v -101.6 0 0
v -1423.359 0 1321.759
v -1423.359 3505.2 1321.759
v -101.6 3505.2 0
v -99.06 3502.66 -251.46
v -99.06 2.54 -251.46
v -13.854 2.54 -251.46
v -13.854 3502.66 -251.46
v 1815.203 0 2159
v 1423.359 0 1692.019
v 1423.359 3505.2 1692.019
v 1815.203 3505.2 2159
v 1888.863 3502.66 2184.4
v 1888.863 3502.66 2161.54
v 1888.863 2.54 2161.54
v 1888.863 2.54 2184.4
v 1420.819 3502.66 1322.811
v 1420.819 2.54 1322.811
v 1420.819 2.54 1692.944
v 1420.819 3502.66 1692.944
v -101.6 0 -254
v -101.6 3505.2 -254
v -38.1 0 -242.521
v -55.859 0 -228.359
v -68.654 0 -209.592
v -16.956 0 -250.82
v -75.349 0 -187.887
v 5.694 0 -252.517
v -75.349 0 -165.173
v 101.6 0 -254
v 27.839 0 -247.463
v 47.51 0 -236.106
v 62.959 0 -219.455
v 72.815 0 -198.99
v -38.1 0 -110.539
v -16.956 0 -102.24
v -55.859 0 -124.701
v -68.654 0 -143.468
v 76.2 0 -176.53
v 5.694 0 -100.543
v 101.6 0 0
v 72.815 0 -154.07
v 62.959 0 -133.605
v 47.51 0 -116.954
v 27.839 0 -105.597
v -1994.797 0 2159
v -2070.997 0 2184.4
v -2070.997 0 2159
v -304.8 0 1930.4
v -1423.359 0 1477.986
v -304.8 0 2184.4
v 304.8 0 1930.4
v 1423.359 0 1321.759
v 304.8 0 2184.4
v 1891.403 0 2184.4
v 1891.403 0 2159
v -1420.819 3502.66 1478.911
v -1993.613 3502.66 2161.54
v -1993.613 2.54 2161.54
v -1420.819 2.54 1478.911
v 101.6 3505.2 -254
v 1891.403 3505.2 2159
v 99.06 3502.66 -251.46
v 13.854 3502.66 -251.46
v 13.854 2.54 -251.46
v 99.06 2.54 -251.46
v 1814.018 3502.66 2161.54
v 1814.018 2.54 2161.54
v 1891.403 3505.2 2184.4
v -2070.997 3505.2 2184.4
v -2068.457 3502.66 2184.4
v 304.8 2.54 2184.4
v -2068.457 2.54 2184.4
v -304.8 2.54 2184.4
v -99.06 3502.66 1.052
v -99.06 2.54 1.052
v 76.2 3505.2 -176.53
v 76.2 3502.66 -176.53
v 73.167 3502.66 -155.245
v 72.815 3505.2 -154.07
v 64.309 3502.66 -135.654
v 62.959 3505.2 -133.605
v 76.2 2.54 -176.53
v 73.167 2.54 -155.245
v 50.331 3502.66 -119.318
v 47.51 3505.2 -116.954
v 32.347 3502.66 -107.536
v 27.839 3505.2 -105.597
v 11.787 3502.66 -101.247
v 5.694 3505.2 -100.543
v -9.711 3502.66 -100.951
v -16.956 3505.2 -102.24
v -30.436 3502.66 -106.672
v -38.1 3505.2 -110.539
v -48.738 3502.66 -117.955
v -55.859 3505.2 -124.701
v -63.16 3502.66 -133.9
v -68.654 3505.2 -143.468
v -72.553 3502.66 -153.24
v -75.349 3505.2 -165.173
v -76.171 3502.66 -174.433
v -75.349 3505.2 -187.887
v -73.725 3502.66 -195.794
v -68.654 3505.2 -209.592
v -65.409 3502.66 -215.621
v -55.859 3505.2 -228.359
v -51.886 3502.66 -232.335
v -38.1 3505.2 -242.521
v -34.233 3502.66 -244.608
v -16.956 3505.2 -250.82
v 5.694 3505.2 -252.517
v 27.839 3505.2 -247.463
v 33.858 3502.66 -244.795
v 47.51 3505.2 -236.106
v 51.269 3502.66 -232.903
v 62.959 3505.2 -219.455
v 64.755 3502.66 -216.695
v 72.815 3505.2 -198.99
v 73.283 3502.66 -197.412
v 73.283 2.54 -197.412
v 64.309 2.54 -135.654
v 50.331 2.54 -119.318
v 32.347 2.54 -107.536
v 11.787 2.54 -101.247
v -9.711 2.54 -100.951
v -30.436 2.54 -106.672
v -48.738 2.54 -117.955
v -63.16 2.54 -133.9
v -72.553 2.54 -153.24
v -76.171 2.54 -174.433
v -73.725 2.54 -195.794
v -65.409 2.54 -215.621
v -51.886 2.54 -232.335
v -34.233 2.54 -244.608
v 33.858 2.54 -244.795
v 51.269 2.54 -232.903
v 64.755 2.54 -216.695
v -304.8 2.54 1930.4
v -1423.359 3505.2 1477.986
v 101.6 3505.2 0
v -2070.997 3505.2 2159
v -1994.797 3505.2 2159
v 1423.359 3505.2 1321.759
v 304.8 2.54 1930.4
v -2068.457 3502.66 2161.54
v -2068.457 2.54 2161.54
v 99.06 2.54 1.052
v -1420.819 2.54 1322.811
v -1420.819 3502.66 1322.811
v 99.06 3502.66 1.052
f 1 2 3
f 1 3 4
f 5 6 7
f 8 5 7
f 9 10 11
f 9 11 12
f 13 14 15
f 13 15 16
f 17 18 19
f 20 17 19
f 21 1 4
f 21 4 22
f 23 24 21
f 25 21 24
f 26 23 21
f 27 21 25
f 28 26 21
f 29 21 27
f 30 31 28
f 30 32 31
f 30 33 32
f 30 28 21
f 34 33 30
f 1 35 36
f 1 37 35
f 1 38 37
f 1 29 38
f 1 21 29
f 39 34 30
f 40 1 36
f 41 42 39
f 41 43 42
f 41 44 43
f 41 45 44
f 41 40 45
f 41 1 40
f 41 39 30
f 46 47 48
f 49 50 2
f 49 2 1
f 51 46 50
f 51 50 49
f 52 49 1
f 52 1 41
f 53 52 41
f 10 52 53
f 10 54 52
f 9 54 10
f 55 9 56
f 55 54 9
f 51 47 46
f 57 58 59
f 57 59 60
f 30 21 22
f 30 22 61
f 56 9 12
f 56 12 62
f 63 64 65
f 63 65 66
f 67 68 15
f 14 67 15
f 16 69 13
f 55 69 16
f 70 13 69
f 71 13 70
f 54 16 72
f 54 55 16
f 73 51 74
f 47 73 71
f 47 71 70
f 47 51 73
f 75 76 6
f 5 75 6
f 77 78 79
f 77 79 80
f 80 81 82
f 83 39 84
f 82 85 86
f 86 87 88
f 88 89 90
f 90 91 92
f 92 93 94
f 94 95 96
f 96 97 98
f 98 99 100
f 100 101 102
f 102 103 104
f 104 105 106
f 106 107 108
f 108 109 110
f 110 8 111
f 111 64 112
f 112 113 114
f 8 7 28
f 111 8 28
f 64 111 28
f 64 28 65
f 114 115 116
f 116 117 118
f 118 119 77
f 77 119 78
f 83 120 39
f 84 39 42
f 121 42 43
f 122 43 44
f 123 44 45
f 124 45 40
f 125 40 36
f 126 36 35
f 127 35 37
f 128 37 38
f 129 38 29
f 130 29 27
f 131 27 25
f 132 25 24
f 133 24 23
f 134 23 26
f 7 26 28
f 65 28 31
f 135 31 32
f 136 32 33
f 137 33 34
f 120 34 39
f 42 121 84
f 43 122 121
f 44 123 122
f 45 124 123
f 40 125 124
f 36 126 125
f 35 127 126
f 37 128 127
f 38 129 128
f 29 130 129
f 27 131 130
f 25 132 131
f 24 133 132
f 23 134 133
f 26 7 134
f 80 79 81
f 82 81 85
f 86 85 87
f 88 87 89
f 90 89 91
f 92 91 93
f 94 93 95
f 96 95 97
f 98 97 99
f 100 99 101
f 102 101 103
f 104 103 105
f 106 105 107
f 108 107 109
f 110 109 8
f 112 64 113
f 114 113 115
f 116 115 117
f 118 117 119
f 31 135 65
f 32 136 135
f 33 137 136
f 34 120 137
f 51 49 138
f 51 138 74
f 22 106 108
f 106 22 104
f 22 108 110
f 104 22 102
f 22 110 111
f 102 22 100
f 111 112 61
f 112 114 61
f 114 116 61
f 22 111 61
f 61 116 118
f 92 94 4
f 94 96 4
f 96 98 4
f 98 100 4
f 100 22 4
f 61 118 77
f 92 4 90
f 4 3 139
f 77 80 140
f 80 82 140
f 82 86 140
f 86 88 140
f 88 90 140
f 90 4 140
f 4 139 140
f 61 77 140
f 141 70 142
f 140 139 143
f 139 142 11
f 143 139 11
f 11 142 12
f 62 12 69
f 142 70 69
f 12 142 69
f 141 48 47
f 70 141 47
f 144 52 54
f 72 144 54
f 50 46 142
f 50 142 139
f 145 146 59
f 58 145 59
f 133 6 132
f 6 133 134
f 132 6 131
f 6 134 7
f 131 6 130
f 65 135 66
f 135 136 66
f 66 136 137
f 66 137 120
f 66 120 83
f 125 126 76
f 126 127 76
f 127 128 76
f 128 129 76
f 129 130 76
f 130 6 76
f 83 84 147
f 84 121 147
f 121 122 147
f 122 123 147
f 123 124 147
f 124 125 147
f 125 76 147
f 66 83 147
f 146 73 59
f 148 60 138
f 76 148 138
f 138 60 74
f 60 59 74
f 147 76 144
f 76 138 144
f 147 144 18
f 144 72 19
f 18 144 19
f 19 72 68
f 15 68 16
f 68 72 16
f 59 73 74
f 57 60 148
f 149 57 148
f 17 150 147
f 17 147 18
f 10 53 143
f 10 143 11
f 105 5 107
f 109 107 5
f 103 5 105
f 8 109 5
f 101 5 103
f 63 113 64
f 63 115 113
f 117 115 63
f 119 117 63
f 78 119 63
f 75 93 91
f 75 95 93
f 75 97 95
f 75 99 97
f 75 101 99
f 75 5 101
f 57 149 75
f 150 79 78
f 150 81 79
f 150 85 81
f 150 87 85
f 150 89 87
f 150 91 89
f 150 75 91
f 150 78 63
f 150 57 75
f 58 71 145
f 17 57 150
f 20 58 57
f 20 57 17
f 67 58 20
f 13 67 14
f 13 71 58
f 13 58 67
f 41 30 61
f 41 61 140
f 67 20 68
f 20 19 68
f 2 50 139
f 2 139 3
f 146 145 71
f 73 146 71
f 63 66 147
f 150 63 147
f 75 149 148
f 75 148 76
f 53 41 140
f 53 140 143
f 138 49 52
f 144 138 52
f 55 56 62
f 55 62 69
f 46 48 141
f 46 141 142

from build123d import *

# Parameters (mm, degrees)
F0_W     = 76.2
F0_H     = 25.4
F1_DEPTH = 3505.2
F2_T     = -2.54
F3_R     = 76.2
F4_DEPTH = 3505.201
F5_W     = 609.6
F5_H     = 254
F6_DEPTH = 25.4


with BuildPart() as f1:
    # F0 (on Front) → F1 (new body)
    with BuildSketch(Plane.XZ):
        with Locations((1853.3025709268, 2171.7)):
            Rectangle(F0_W, F0_H)
        Polygon((1423.3592440619, 1692.0193074747), (1815.2025709268, 2159), (1815.2025709268, 2184.4), (-1994.7974290732, 2184.4), (-1994.7974290732, 2159), (-1423.3592440619, 1477.9864900672), (-1423.3592440619, 1321.7592440619), (-101.6, 0), (-101.6, -254), (101.6, -254), (101.6, 0), (1423.3592440619, 1321.7592440619), align=None)
        with Locations((-2032.8974290732, 2171.7)):
            Rectangle(F0_W, F0_H)
    extrude(amount=-F1_DEPTH)

    # F2
    f2_openings = [f1.faces().sort_by_distance(p)[0] for p in [
        (-89.797429, 1752.6, 2184.4),
    ]]
    offset(amount=F2_T, openings=f2_openings, kind=Kind.INTERSECTION)

    # F3 (on face) → F4 (cut, through all)
    with BuildSketch(Plane.XZ):
        with Locations((0, -176.53)):
            Circle(F3_R)
    extrude(amount=-F4_DEPTH, mode=Mode.SUBTRACT)

    # F5 (on face) → F6 (cut)
    with BuildSketch(Plane.XZ):
        with Locations((0, 2057.4)):
            Rectangle(F5_W, F5_H)
    extrude(amount=-F6_DEPTH, mode=Mode.SUBTRACT)


solid = f1.part
